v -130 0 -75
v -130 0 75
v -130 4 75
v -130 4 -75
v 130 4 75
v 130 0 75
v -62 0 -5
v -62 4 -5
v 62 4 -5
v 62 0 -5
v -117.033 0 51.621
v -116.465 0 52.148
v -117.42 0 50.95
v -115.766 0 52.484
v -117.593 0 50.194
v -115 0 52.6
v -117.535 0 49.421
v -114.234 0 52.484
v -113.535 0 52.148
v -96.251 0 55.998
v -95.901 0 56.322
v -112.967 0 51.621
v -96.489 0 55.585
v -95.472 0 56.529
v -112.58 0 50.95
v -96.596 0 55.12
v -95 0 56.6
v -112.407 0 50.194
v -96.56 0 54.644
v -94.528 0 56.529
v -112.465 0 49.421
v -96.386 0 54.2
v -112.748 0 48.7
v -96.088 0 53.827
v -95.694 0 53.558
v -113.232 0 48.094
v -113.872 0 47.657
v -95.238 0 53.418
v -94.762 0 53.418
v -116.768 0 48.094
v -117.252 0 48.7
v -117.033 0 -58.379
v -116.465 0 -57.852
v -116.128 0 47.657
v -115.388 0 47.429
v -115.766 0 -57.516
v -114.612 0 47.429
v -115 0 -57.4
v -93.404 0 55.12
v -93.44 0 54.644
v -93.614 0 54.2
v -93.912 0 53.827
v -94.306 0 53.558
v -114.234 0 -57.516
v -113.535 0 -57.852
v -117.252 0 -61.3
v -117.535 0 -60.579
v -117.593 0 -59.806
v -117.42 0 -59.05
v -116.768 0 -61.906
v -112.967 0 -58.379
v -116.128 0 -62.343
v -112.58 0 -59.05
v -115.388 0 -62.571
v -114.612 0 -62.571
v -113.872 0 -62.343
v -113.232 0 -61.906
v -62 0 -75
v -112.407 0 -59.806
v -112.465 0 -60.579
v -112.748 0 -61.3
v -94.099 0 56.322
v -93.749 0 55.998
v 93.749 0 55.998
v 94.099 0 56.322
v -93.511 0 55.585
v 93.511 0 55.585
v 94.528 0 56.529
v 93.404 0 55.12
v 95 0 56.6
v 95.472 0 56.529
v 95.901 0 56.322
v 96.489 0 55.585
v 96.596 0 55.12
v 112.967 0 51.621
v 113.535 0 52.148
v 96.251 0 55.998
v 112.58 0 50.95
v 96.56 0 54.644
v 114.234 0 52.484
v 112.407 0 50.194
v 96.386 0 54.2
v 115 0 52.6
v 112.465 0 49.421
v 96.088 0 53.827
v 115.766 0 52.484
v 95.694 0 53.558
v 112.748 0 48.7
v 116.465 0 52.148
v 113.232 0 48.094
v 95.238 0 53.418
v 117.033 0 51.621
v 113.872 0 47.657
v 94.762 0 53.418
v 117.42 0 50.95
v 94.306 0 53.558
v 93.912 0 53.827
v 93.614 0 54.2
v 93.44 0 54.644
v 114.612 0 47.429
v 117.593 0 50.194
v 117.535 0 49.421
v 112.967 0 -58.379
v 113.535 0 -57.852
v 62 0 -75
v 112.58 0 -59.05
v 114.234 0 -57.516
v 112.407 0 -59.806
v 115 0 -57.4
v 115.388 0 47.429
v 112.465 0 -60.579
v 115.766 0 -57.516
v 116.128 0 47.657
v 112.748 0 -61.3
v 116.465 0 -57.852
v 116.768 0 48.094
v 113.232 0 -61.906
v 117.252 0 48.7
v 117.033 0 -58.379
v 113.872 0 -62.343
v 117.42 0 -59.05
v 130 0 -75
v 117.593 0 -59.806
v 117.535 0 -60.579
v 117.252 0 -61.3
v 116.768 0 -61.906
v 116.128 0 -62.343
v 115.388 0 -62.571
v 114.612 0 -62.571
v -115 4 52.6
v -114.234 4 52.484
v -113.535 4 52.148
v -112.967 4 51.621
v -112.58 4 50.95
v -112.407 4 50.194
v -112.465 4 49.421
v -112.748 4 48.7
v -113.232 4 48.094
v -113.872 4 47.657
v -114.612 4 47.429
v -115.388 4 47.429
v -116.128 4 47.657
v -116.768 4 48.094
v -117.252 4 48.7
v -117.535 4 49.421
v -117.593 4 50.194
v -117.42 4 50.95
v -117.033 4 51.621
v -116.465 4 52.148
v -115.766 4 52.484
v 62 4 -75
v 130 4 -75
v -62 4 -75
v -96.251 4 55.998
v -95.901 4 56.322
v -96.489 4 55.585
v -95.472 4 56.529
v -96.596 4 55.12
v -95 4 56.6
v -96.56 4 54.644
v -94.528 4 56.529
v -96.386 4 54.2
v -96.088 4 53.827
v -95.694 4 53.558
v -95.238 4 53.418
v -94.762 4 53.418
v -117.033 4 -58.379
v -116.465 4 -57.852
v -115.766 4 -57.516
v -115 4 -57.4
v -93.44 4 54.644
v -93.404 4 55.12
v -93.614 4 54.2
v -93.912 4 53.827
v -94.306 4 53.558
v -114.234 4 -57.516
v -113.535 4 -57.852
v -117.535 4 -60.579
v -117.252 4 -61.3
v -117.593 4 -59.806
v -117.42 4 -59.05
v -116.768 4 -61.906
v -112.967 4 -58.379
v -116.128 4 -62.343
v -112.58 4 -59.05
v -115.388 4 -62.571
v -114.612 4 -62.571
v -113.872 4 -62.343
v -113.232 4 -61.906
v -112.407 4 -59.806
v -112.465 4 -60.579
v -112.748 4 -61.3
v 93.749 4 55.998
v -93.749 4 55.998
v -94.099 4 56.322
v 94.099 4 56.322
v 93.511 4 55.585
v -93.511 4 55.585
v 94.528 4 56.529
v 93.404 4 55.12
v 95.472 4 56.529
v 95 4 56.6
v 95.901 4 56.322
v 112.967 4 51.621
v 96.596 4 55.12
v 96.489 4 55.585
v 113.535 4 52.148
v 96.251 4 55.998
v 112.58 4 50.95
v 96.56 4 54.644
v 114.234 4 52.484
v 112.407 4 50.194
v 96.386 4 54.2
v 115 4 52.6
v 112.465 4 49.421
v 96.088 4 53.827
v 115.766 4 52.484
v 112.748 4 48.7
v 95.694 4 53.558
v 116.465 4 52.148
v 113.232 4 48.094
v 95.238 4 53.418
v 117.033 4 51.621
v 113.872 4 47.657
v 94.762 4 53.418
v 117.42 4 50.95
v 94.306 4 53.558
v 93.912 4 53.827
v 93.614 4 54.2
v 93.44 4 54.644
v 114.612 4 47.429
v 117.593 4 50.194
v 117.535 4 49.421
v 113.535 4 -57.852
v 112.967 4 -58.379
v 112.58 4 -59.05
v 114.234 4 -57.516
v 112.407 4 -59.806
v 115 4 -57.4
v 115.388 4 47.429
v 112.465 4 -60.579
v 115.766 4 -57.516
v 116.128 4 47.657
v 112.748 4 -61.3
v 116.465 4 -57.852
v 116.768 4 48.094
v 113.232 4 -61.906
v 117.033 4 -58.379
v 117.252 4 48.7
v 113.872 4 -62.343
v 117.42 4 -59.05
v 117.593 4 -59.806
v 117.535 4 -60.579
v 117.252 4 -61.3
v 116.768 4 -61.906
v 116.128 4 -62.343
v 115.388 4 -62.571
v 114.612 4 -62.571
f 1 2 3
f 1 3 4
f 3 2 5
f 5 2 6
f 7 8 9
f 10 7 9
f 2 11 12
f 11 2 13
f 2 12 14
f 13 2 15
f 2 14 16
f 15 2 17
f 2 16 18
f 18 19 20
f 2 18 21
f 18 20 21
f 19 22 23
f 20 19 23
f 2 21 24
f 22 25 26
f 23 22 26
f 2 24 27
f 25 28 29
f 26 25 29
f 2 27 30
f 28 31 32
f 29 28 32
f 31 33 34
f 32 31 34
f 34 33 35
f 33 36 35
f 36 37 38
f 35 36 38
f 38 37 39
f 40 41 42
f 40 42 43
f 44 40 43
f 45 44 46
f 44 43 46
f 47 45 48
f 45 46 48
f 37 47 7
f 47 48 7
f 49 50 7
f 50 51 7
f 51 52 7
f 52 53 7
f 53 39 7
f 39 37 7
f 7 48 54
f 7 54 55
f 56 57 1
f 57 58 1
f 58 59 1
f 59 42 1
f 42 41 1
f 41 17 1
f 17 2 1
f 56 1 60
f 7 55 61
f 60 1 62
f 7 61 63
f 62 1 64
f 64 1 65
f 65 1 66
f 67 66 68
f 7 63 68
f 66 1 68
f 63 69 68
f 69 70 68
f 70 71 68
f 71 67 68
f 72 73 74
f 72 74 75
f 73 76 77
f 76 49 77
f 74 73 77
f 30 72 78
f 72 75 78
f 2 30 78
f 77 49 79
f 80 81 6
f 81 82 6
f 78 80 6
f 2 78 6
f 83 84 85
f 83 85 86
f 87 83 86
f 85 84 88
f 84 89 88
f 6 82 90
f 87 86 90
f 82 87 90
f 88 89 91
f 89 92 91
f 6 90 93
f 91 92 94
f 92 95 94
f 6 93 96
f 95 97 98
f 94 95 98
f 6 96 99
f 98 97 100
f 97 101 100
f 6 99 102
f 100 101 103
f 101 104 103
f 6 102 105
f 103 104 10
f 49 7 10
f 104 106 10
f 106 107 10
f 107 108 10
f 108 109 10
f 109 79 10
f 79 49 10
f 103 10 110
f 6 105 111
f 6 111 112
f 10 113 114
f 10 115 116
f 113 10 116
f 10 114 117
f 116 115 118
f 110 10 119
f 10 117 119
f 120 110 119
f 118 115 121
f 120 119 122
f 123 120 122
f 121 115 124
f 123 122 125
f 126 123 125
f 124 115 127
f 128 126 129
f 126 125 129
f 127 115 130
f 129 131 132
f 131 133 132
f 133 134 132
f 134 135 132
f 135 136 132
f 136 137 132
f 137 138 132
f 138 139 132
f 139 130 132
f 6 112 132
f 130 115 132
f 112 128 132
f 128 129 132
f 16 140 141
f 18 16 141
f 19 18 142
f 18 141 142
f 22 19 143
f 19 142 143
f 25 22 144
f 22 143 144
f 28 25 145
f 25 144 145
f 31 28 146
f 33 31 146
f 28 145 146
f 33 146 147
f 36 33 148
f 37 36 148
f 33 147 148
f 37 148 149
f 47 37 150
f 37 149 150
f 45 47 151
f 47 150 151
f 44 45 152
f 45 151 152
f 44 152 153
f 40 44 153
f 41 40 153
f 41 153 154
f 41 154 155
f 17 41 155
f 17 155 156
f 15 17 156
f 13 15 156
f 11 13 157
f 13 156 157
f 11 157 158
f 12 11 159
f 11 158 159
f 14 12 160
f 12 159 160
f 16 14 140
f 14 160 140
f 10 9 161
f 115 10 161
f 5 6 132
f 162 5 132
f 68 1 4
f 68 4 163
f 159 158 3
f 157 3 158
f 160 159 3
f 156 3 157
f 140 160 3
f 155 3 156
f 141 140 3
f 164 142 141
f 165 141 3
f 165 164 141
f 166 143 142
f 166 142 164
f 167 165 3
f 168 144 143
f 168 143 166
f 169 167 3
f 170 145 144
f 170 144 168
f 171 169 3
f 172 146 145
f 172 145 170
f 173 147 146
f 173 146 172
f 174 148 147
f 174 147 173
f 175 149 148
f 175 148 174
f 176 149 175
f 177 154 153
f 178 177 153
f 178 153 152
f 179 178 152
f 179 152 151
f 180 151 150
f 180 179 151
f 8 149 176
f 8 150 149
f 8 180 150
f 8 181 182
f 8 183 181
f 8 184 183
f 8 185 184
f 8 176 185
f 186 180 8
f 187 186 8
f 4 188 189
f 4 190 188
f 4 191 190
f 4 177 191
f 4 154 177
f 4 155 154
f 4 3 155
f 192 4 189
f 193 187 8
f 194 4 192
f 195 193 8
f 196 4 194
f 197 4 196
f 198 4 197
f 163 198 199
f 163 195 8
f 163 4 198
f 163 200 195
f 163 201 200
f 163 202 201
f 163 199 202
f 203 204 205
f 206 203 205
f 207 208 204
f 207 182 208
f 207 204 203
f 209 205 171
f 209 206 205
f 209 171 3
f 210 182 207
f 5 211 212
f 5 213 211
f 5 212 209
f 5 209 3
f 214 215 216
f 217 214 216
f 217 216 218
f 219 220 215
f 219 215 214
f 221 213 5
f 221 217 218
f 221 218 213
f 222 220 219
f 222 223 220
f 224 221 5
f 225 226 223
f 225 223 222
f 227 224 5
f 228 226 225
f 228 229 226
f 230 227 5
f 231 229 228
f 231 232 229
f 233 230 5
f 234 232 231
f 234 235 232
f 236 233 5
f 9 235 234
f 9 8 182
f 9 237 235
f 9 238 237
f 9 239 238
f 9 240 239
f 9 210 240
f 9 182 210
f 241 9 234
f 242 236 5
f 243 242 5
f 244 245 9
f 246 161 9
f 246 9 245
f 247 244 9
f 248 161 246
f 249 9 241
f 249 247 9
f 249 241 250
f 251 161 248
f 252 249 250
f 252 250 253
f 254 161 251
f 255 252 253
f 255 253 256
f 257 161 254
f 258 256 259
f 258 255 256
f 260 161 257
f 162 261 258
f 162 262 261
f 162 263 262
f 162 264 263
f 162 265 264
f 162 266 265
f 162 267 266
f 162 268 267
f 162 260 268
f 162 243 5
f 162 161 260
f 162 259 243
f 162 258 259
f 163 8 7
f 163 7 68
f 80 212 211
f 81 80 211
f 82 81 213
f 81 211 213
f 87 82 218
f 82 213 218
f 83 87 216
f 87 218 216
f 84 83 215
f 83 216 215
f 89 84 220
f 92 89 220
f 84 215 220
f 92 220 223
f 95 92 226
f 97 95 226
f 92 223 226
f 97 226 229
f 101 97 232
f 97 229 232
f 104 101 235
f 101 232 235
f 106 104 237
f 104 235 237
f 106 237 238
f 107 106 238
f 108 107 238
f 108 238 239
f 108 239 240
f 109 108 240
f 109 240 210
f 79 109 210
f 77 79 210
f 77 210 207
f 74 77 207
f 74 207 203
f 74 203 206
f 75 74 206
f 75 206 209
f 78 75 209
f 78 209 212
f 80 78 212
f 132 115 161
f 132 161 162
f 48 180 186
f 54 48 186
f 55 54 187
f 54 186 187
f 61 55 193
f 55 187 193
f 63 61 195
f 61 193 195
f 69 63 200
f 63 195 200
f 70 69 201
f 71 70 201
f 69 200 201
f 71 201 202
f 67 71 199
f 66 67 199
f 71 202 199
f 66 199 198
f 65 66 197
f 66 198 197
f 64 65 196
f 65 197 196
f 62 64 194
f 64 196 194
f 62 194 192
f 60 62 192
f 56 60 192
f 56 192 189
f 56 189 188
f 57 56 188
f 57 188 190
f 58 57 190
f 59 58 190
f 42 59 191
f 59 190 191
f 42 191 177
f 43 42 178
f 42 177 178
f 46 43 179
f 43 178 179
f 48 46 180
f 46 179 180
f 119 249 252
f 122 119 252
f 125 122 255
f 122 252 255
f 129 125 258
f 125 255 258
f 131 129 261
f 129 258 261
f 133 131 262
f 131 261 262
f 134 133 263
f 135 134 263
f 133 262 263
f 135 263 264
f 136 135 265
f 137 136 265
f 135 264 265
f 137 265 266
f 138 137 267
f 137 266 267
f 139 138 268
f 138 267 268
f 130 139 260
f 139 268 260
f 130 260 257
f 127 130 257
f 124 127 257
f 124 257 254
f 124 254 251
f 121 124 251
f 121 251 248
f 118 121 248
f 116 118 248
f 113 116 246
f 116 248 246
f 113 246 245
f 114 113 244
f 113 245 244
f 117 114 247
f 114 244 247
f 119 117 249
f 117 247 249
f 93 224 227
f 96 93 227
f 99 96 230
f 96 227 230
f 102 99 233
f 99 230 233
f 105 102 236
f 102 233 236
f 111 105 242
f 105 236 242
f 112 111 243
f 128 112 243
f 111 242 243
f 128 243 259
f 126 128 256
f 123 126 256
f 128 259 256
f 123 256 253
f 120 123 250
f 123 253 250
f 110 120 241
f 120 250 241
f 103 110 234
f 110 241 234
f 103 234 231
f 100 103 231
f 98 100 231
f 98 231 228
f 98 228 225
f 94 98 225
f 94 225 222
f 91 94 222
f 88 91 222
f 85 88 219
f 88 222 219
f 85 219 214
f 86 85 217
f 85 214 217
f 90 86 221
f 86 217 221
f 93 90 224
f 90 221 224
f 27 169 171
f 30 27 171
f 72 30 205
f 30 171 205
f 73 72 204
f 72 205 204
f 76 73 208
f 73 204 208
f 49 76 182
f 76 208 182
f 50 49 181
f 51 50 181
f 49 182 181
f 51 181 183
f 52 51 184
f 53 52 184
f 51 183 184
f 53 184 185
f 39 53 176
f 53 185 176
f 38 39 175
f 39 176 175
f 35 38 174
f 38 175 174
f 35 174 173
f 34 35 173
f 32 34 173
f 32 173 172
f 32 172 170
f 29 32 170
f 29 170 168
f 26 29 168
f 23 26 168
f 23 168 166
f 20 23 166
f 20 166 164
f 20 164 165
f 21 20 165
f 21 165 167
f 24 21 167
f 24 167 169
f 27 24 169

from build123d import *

# Parameters (mm, degrees)
CROQUIS1_W              = 260
CROQUIS1_H              = 150
SALIENTE_EXTRUIR1_DEPTH = 4
CROQUIS2_R              = 2.6
CROQUIS2_W              = 124
CROQUIS2_H              = 70
CORTAR_EXTRUIR1_DEPTH   = 4
CROQUIS3_R              = 1.6
CORTAR_EXTRUIR2_DEPTH   = 10


with BuildPart() as part:
    # Croquis1 → Saliente-Extruir1 (new body)
    with BuildSketch(Plane(origin=(0, 0, 0), x_dir=(1, 0, 0), z_dir=(0, 1, 0))):
        Rectangle(CROQUIS1_W, CROQUIS1_H)
    extrude(amount=SALIENTE_EXTRUIR1_DEPTH)

    # Croquis2 → Cortar-Extruir1 (cut)
    with BuildSketch(Plane(origin=(0, 4, 0), x_dir=(1, 0, 0), z_dir=(0, 1, 0))):
        with Locations(Location((-115, 60, 0), (0, 0, 270))):
            Circle(CROQUIS2_R)
        with Locations(Location((115, 60, 0), (0, 0, 270))):
            Circle(CROQUIS2_R)
        with Locations(Location((115, -50, 0), (0, 0, 270))):
            Circle(CROQUIS2_R)
        with Locations(Location((-115, -50, 0), (0, 0, 270))):
            Circle(CROQUIS2_R)
        with Locations((0, 40)):
            Rectangle(CROQUIS2_W, CROQUIS2_H)
    extrude(amount=-CORTAR_EXTRUIR1_DEPTH, mode=Mode.SUBTRACT)

    # Croquis3 → Cortar-Extruir2 (cut)
    with BuildSketch(Plane(origin=(0, 4, 0), x_dir=(1, 0, 0), z_dir=(0, 1, 0))):
        with Locations(Location((95, -55, 0), (0, 0, 270))):
            Circle(CROQUIS3_R)
        with Locations(Location((-95, -55, 0), (0, 0, 270))):
            Circle(CROQUIS3_R)
    extrude(amount=-CORTAR_EXTRUIR2_DEPTH, mode=Mode.SUBTRACT)


solid = part.part
